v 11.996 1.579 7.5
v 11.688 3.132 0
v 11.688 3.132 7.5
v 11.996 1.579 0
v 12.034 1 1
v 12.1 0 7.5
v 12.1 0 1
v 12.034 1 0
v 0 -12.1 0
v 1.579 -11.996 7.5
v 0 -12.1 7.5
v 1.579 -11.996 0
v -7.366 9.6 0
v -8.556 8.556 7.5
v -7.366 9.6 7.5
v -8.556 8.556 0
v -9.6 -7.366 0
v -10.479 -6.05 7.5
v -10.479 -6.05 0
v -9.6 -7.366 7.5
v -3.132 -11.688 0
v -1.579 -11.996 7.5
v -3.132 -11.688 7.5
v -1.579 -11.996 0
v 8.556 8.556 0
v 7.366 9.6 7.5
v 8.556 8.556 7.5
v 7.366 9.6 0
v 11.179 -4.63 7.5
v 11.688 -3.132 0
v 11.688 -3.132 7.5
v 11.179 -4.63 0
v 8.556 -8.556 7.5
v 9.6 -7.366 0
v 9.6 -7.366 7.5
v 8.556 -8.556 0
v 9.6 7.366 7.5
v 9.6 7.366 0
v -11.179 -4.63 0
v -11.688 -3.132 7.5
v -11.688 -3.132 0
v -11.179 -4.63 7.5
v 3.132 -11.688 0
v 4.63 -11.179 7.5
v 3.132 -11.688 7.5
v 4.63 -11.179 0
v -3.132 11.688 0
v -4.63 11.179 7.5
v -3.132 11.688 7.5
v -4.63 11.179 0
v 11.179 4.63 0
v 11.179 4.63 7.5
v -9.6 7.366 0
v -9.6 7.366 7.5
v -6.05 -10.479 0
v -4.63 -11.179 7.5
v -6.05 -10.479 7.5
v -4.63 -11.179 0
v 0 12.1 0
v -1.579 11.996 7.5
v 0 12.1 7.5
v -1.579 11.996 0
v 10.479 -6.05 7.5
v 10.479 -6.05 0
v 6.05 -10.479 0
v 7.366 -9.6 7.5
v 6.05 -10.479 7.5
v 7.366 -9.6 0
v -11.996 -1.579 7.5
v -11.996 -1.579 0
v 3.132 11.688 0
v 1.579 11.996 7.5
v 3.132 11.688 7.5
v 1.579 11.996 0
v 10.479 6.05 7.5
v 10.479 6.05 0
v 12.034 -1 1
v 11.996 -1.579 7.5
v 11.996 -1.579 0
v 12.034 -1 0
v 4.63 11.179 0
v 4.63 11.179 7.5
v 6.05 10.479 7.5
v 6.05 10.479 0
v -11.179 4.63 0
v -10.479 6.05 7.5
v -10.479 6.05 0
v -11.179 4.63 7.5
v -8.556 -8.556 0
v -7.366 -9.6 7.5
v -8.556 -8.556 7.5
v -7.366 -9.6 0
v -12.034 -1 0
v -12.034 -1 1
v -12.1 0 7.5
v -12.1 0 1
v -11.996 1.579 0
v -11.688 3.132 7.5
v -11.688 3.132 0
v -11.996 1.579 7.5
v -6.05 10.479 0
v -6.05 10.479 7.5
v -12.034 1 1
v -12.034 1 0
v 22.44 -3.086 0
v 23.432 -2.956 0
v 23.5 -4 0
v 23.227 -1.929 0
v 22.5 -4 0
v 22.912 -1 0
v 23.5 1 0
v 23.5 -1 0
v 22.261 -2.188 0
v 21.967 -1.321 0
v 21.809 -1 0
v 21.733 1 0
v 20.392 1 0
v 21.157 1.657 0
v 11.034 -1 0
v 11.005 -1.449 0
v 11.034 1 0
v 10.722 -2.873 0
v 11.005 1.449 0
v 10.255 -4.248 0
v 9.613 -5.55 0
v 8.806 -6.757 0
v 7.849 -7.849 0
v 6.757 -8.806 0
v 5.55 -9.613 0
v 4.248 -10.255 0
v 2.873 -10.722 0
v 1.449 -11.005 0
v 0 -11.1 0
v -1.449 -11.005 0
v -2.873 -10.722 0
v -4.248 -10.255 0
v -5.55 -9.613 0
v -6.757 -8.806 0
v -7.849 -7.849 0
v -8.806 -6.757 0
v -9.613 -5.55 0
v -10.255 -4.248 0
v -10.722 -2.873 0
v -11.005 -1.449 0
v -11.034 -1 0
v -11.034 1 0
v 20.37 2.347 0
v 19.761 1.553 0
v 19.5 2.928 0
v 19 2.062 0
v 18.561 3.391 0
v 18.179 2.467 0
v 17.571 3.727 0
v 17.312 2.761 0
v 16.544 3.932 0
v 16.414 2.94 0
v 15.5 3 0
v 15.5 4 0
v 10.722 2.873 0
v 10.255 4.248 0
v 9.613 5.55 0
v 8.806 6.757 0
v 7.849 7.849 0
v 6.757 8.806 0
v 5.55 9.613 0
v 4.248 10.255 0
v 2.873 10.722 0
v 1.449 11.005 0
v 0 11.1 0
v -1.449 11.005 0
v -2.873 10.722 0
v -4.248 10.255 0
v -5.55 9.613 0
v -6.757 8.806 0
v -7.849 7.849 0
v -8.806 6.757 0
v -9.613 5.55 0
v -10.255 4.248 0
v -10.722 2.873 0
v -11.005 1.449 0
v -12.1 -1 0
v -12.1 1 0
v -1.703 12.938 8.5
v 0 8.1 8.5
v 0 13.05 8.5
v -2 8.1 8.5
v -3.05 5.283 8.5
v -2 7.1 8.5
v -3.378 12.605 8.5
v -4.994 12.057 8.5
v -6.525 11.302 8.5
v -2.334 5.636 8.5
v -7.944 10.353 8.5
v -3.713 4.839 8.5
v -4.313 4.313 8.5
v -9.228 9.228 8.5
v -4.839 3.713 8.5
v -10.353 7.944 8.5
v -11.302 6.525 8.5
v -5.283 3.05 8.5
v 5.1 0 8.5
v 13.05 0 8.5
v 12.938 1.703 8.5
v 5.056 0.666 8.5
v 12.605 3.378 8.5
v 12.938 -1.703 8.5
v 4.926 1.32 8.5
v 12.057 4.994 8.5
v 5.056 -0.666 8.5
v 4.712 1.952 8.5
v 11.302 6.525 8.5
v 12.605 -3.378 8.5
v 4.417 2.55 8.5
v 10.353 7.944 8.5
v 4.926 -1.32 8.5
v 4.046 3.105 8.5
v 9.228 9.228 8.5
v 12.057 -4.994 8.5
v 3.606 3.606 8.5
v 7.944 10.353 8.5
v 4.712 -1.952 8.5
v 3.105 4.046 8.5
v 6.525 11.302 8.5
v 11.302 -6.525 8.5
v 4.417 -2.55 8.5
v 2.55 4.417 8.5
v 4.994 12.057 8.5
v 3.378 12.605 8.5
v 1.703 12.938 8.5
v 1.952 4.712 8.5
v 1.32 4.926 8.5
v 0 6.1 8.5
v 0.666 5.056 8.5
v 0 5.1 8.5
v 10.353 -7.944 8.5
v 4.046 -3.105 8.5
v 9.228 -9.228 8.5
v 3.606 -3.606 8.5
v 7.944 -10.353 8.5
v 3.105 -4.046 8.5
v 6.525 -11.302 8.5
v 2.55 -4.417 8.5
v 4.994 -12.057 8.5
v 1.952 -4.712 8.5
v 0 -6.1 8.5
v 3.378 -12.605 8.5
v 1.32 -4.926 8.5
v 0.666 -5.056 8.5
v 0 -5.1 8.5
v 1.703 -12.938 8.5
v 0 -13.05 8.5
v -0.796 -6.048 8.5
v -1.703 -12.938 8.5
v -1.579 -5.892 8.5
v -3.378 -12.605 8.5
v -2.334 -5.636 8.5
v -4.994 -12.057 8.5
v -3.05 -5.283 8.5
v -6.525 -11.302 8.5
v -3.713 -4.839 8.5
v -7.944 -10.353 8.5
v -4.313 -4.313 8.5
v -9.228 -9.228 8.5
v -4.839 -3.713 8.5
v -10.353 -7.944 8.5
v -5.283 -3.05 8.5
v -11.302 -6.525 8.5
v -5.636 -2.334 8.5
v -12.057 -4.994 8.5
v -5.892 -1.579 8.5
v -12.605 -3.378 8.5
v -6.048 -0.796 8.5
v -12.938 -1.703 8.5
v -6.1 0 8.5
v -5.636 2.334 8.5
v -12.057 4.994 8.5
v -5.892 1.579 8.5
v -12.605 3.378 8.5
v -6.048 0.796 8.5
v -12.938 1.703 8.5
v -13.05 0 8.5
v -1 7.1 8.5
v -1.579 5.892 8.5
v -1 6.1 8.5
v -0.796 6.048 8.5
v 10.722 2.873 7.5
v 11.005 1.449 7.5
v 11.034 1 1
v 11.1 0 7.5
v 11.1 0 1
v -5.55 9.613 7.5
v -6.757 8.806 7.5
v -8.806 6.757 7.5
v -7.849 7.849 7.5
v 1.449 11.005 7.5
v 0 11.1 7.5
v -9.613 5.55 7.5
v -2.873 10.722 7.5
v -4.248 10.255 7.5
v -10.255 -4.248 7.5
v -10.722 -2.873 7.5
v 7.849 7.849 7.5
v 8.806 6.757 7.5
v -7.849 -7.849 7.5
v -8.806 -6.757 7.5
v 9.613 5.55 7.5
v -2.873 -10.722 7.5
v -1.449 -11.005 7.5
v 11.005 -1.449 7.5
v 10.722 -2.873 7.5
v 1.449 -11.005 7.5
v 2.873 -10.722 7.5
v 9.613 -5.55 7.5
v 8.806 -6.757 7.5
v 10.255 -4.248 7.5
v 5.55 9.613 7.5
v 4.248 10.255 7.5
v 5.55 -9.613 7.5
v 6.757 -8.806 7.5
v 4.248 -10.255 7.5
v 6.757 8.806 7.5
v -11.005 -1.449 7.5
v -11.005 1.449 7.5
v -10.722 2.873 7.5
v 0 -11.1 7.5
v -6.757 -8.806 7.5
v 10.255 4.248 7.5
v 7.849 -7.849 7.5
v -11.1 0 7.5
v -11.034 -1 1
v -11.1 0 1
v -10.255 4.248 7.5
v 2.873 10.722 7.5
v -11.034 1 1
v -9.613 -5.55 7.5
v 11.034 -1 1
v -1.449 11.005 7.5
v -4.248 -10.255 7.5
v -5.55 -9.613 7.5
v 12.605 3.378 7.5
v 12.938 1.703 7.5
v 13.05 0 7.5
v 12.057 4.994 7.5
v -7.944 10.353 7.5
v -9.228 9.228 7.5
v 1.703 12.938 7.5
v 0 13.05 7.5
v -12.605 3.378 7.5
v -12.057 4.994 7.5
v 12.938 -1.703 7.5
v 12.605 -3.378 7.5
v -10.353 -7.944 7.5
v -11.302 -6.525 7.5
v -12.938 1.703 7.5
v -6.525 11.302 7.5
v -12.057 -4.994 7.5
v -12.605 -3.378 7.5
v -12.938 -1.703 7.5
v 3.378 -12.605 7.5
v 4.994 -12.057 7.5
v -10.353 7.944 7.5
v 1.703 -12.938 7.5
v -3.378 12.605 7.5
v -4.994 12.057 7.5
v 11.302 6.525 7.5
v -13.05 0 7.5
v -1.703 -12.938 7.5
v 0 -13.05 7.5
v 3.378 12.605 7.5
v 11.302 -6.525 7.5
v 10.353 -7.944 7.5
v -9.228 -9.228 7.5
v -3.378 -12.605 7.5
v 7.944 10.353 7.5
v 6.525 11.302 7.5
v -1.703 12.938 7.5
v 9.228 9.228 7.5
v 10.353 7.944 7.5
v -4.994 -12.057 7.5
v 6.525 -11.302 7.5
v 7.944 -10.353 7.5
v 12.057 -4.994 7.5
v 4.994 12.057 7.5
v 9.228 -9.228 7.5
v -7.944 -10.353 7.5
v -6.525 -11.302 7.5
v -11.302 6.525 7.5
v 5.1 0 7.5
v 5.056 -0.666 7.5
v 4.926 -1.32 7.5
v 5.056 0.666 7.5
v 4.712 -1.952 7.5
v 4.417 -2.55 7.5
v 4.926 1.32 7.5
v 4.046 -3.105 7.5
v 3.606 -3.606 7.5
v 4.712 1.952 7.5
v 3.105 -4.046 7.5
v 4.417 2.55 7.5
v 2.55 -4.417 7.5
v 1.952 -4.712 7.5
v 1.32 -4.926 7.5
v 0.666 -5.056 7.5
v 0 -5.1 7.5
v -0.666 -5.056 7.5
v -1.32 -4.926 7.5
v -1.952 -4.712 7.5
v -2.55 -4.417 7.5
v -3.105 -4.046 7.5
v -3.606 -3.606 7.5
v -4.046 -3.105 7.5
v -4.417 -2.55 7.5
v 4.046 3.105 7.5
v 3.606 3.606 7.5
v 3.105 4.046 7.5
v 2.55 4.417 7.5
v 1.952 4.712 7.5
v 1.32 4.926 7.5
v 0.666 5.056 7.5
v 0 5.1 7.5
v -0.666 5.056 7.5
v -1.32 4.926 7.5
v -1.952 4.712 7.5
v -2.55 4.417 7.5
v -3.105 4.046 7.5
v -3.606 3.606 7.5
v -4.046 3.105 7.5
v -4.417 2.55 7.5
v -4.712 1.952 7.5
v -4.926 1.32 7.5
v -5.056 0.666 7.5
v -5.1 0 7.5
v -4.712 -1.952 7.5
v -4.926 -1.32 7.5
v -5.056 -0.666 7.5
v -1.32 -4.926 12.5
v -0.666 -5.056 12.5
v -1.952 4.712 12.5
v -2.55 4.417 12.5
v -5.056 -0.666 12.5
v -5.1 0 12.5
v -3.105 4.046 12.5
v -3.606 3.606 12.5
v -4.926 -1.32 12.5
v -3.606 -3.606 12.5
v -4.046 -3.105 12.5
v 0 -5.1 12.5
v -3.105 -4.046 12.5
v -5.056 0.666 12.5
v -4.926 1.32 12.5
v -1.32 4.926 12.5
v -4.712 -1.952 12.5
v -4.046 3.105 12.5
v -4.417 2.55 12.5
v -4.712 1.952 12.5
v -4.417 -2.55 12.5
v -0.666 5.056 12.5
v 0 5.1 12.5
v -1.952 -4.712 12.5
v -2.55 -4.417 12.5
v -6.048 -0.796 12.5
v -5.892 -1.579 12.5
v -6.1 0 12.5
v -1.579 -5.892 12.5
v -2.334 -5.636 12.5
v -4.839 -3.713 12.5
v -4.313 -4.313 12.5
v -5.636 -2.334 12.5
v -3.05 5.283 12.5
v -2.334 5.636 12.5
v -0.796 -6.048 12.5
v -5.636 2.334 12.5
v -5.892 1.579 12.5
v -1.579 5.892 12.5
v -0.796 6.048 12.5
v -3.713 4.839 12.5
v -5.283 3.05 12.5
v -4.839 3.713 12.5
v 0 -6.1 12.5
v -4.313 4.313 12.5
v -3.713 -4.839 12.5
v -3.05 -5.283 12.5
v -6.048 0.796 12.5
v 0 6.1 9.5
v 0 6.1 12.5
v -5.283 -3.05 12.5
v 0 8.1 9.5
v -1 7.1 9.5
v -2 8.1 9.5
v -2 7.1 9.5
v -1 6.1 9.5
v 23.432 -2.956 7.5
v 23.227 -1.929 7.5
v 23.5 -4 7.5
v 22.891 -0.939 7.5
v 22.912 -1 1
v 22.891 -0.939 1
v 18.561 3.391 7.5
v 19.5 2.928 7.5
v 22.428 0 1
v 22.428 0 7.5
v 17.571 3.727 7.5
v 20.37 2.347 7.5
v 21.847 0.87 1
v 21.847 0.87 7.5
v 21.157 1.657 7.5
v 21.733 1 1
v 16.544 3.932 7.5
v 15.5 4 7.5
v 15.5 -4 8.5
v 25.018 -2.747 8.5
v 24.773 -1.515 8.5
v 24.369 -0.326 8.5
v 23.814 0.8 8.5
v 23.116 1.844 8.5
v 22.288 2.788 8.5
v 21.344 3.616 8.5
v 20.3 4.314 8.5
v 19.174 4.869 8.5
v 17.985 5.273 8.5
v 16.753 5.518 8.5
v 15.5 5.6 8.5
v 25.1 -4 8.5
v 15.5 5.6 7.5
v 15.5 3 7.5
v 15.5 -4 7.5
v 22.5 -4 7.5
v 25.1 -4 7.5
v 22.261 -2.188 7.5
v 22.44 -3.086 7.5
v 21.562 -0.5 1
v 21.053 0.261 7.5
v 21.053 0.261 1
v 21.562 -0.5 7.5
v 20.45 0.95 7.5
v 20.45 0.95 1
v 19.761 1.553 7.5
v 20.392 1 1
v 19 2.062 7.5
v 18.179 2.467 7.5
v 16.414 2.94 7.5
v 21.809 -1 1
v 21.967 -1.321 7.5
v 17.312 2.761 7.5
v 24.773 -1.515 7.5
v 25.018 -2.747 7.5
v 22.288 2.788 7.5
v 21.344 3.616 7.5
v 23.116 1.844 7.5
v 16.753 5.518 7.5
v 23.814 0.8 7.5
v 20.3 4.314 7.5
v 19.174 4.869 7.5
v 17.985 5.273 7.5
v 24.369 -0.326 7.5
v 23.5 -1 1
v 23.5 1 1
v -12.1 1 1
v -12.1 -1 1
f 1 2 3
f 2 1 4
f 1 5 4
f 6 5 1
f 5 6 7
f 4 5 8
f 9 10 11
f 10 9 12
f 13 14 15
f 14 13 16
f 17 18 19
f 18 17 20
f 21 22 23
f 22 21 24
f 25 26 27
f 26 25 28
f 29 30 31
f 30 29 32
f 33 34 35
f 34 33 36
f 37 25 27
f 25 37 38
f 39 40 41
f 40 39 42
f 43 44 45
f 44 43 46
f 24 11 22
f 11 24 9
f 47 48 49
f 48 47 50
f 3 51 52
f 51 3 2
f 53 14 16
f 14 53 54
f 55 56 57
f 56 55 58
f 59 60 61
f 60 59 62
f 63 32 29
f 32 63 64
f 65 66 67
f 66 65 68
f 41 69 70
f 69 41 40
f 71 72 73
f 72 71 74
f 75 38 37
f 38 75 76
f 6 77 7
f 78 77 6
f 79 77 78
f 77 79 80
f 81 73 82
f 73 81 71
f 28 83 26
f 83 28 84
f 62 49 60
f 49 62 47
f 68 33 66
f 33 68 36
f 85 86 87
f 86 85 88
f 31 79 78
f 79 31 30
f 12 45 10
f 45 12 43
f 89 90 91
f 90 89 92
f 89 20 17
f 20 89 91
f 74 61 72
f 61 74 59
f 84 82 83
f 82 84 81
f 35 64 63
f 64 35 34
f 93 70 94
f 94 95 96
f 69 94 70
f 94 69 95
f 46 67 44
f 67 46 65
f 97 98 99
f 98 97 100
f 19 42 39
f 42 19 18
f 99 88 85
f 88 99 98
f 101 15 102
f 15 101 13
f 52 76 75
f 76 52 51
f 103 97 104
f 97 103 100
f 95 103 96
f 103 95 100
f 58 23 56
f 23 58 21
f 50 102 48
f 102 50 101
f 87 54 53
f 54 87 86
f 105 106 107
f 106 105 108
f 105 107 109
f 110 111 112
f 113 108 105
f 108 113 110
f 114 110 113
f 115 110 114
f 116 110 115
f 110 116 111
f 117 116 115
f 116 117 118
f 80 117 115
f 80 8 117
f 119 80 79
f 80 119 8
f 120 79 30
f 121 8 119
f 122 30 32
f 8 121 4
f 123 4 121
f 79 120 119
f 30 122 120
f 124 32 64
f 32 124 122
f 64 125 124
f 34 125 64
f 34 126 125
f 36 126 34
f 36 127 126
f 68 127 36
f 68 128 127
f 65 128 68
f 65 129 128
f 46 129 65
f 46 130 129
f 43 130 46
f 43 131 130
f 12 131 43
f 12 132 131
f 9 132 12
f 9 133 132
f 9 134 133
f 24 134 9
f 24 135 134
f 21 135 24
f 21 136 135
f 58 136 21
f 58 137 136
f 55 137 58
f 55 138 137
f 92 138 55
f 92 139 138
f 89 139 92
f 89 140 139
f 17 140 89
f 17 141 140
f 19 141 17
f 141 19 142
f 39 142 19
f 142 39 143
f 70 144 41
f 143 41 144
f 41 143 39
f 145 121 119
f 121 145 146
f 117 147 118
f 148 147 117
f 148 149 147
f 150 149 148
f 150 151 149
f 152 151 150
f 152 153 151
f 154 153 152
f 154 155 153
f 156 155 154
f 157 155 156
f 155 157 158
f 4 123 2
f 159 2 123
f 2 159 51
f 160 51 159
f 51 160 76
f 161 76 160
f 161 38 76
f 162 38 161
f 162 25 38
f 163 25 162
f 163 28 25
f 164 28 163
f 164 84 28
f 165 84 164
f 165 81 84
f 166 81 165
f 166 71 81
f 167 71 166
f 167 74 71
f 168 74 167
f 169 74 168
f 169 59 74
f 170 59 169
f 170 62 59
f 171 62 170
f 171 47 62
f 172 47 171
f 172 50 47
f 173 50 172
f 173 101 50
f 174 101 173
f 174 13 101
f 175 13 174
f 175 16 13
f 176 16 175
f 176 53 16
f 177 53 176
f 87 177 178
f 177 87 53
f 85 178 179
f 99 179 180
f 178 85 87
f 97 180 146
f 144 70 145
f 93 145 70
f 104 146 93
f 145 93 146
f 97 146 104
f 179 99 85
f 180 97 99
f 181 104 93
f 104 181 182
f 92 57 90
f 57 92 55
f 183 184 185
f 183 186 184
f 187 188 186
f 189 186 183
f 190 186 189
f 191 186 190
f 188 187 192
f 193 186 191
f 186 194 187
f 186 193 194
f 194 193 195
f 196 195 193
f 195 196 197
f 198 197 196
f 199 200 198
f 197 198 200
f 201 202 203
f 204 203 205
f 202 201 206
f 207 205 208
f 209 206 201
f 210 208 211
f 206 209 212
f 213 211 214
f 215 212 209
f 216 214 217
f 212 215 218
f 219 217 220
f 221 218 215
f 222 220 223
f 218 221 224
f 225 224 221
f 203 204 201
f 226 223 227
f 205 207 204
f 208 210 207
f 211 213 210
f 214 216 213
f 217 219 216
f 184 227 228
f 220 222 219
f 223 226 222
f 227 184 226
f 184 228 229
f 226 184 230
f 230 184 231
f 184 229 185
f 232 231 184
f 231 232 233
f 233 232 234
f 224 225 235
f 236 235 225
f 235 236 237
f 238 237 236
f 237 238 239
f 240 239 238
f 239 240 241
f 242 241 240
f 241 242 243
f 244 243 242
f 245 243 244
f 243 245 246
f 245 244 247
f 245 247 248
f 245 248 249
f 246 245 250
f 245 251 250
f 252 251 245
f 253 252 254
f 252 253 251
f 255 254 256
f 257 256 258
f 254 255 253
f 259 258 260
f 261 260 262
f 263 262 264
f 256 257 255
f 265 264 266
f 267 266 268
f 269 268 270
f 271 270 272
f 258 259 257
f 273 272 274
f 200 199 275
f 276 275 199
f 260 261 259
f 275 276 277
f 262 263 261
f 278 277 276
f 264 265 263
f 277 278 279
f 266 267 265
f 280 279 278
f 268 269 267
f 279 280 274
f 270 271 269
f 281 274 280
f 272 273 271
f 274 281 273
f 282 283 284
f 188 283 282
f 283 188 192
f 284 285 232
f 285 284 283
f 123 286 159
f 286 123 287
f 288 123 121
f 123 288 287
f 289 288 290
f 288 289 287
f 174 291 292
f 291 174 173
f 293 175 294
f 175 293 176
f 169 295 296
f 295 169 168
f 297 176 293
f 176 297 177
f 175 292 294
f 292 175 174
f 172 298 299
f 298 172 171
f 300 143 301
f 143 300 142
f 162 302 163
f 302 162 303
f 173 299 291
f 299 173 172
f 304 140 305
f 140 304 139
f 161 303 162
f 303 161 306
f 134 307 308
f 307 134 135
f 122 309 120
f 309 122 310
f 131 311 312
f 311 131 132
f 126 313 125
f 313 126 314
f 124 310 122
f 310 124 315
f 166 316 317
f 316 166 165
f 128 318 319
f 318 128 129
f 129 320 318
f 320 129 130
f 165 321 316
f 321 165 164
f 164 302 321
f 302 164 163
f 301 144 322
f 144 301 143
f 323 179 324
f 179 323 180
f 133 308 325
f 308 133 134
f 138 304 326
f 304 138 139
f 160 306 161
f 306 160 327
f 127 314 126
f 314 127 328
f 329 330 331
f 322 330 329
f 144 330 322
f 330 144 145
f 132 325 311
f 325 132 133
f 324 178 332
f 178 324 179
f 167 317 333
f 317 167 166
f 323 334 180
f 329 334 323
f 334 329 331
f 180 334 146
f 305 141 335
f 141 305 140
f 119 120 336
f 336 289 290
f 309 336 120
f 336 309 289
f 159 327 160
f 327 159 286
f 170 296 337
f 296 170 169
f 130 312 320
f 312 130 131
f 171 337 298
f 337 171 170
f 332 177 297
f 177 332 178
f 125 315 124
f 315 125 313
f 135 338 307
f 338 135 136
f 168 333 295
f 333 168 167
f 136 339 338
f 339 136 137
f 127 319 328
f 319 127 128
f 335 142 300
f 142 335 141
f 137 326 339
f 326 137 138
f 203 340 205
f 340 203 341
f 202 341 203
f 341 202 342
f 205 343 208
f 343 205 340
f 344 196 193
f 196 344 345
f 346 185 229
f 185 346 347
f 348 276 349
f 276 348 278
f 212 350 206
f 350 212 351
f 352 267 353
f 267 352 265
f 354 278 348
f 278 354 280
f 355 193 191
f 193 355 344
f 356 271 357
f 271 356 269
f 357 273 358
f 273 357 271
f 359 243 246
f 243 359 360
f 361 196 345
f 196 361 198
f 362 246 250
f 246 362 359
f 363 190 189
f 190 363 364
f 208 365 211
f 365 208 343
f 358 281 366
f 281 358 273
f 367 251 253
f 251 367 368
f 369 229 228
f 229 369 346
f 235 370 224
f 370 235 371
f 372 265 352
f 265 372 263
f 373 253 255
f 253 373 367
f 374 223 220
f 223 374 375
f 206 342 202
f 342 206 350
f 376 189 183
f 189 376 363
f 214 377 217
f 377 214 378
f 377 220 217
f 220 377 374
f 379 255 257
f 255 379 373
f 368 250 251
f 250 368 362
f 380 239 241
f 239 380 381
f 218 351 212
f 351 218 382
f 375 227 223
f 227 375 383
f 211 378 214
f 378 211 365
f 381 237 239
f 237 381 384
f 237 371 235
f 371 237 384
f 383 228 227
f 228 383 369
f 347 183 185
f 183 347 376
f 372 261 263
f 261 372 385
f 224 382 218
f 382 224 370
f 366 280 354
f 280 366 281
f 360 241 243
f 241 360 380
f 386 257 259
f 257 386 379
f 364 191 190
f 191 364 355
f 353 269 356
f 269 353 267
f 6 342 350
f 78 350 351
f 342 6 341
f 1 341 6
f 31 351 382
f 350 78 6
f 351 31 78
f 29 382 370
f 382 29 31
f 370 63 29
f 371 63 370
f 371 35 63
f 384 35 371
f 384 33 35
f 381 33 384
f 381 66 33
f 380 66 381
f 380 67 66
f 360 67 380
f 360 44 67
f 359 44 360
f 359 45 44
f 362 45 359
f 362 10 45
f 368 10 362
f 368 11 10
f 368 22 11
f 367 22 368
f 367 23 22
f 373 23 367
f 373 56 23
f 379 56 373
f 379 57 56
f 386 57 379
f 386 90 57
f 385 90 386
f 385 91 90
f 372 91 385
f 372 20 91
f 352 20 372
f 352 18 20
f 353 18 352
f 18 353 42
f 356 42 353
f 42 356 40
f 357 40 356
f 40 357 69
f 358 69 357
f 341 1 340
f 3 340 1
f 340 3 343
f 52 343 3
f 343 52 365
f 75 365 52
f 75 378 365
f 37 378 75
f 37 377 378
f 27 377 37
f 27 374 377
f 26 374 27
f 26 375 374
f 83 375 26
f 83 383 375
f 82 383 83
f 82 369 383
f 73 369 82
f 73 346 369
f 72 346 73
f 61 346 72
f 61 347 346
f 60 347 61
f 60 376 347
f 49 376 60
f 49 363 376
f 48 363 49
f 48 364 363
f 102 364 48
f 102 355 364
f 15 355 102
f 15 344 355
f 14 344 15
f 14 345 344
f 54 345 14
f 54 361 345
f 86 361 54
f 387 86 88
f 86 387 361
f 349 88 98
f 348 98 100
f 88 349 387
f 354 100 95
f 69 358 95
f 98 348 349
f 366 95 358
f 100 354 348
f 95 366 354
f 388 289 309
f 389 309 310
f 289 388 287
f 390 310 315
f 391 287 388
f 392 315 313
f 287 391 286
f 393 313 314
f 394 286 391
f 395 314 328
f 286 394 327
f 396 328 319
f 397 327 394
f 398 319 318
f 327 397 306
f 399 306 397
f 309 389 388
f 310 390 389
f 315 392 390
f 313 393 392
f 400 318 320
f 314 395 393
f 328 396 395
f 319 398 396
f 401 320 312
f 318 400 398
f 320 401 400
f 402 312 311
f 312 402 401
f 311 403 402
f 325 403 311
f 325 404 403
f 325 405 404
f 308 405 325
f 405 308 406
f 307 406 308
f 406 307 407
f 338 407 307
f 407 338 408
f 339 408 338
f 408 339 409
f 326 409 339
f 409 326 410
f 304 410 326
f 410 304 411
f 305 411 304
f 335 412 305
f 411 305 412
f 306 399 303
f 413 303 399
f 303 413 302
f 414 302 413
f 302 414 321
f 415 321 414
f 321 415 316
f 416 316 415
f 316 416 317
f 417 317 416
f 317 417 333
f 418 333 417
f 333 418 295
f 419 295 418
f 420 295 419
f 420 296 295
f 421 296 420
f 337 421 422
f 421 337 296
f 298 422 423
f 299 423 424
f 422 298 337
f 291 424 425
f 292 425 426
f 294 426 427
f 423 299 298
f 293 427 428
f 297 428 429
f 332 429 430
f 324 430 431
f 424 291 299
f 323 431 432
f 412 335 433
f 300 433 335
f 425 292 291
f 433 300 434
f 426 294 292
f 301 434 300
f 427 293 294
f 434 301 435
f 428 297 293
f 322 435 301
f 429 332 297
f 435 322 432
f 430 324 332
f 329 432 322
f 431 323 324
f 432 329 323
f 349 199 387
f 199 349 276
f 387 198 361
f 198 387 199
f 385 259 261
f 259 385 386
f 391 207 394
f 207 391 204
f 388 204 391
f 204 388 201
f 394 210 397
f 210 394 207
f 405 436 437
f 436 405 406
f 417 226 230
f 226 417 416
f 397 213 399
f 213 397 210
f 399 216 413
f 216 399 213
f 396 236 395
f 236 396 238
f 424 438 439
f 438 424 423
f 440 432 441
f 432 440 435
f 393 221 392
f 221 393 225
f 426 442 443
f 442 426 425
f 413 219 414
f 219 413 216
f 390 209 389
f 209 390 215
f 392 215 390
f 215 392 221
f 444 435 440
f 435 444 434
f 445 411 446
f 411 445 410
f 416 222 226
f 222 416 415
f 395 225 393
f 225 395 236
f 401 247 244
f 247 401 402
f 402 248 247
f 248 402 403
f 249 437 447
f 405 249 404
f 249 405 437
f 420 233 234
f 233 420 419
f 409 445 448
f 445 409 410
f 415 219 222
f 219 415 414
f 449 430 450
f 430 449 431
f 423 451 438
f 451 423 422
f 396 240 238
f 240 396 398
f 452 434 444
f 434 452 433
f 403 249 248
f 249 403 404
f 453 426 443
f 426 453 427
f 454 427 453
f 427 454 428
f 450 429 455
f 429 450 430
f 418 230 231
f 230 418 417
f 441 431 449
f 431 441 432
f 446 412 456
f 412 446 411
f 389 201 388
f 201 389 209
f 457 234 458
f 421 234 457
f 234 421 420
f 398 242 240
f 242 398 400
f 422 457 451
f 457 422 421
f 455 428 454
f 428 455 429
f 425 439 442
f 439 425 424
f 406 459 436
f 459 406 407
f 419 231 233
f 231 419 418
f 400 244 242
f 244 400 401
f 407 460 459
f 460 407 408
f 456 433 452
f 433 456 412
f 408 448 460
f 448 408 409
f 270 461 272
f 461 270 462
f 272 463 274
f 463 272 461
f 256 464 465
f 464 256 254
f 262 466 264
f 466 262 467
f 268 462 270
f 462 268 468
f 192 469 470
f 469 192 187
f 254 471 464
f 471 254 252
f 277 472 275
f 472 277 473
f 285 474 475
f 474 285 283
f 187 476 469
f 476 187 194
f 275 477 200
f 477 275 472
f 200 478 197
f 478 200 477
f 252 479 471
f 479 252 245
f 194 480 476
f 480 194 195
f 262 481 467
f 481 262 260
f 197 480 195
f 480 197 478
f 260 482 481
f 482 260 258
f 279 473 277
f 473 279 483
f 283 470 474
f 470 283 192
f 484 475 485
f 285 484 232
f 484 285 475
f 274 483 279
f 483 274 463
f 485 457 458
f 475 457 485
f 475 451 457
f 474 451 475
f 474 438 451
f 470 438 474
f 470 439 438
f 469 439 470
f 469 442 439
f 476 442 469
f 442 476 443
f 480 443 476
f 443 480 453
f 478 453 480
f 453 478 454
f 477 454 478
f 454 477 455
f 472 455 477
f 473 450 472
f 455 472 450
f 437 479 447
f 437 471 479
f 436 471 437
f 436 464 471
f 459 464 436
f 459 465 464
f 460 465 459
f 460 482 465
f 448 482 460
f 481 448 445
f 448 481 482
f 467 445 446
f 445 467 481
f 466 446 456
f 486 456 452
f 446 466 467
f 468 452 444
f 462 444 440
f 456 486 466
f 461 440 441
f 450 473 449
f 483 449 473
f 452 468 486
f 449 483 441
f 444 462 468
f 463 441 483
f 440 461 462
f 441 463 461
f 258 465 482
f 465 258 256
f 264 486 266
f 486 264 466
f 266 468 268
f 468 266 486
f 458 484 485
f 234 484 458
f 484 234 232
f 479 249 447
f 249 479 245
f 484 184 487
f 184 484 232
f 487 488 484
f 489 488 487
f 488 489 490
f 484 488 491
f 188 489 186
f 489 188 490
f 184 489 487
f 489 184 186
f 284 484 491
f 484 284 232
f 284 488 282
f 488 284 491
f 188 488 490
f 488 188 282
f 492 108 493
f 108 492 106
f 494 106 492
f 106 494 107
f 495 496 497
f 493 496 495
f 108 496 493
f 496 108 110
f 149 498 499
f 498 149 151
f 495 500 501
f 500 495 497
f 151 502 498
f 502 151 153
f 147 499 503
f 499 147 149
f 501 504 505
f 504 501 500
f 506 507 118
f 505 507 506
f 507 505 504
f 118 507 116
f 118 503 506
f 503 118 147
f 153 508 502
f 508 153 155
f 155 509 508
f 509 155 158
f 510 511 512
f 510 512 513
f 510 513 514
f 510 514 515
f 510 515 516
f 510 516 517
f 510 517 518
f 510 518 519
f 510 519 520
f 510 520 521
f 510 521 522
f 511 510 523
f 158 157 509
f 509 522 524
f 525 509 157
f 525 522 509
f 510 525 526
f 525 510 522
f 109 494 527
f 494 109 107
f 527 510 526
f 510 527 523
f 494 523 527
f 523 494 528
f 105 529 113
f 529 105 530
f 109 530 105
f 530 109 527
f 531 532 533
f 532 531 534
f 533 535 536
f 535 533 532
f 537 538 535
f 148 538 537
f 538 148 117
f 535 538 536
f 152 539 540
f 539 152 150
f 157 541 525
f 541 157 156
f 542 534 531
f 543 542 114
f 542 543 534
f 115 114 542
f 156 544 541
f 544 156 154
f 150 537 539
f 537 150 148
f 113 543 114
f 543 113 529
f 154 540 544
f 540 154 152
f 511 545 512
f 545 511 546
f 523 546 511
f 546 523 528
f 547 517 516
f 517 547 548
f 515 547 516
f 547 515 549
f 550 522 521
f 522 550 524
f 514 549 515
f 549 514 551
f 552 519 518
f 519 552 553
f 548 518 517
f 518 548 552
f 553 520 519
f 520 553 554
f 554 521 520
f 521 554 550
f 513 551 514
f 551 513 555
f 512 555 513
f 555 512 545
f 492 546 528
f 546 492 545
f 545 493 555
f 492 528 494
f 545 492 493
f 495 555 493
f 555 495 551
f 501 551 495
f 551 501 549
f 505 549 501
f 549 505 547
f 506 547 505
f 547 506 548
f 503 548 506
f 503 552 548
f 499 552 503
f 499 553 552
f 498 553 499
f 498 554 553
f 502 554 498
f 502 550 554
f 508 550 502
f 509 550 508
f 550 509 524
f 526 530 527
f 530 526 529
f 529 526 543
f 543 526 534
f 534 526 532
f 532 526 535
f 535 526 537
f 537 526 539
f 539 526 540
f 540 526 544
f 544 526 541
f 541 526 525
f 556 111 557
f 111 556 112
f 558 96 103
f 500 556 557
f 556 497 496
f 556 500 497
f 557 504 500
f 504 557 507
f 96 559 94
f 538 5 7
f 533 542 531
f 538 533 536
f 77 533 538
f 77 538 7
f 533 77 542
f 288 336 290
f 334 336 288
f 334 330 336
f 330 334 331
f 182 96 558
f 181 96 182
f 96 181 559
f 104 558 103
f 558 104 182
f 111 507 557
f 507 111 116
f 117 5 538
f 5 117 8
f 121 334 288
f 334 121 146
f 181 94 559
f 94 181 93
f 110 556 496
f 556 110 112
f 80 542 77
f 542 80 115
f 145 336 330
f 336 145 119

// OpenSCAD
////////////////////////////////////////////////////////////////////////////////////////////////////////////////////////

outer_ring_inner_radius = 22.2 / 2;
wall_thickness = 1.0;
outer_ring_top_radius = 26.1 / 2;

inlet_radius = 10.2 / 2;

top_radius = 12.9 / 2;

nozzle_top_radius = 9.6;
nozzle_radius = 8.0;

total_width_at_bottom = 35.6;

lower_height = 8.5;
total_height = 13.5;

////////////////////////////////////////////////////////////////////////////////////////////////////////////////////////

$fn = 48;

// outer ring
render()
{
    difference()
    {
        cylinder( h = lower_height, r = outer_ring_inner_radius + wall_thickness );

        // remove the inside
        cylinder( h = lower_height, r = outer_ring_inner_radius );
    }

    // add the top
    translate([ 0, 0, lower_height - wall_thickness ])
    {
        difference()
        {
            cylinder( h = wall_thickness, r = outer_ring_top_radius );

            // remove the inlet
            cylinder( h = wall_thickness, r = inlet_radius );
        }

        // add the half top
        difference()
        {
            cylinder( h = total_height - lower_height, r = inlet_radius + wall_thickness );

            // remove the center
            cylinder( h = total_height - lower_height, r = inlet_radius );

            // remove the side
            translate([ 0, - inlet_radius - wall_thickness, 0 ])
                cube([ inlet_radius + wall_thickness, inlet_radius * 2 + wall_thickness * 2, total_height - lower_height ]);
        }

        // add little hook by the top half
        difference()
        {
            translate([ -wall_thickness * 2, inlet_radius + wall_thickness, wall_thickness ])
                cube([ wall_thickness * 2, wall_thickness * 2, wall_thickness ]);

            translate([ -wall_thickness * 2, inlet_radius + wall_thickness, wall_thickness ])
                cube([ wall_thickness, wall_thickness, wall_thickness ]);
        }
    }
}

// nozzle
translate([ total_width_at_bottom - outer_ring_inner_radius - nozzle_radius - wall_thickness, -nozzle_radius / 2, 0 ])
{
    render()
    {
        // nozzle
        difference()
        {
            cylinder( h = lower_height, r = nozzle_radius );

            // remove left
            translate([ -nozzle_radius, -nozzle_radius, 0 ])
                cube([ nozzle_radius, nozzle_radius * 2, lower_height ]);
            
            // remove bottom
            translate([ -nozzle_radius, -nozzle_radius, 0 ])
                cube([ nozzle_radius * 2, nozzle_radius, lower_height ]);

            // // remove inside
            cylinder( h = lower_height, r = nozzle_radius - wall_thickness );
        }

        // nozzle top
        translate([ 0, 0, lower_height - wall_thickness ])
        {
            difference()
            {
                cylinder( h = wall_thickness, r = nozzle_top_radius );

                // remove left
                translate([ -nozzle_top_radius, -nozzle_top_radius, 0 ])
                    cube([ nozzle_top_radius, nozzle_top_radius * 2, wall_thickness ]);

                // remove bottom
                translate([ -nozzle_top_radius, -nozzle_top_radius, 0 ])
                    cube([ nozzle_top_radius * 2, nozzle_top_radius, wall_thickness ]);
            }
        }

        // add inner vane
        // TODO finish
    }
}

# translate([ -outer_ring_inner_radius - wall_thickness, -1, 0 ]) cube([ total_width_at_bottom, 2, 1 ]); // end to end check

// % cylinder( h = 0.1, r = 24.22/2 ); // outer diameter check

////////////////////////////////////////////////////////////////////////////////////////////////////////////////////////


////////////////////////////////////////////////////////////////////////////////////////////////////////////////////////
